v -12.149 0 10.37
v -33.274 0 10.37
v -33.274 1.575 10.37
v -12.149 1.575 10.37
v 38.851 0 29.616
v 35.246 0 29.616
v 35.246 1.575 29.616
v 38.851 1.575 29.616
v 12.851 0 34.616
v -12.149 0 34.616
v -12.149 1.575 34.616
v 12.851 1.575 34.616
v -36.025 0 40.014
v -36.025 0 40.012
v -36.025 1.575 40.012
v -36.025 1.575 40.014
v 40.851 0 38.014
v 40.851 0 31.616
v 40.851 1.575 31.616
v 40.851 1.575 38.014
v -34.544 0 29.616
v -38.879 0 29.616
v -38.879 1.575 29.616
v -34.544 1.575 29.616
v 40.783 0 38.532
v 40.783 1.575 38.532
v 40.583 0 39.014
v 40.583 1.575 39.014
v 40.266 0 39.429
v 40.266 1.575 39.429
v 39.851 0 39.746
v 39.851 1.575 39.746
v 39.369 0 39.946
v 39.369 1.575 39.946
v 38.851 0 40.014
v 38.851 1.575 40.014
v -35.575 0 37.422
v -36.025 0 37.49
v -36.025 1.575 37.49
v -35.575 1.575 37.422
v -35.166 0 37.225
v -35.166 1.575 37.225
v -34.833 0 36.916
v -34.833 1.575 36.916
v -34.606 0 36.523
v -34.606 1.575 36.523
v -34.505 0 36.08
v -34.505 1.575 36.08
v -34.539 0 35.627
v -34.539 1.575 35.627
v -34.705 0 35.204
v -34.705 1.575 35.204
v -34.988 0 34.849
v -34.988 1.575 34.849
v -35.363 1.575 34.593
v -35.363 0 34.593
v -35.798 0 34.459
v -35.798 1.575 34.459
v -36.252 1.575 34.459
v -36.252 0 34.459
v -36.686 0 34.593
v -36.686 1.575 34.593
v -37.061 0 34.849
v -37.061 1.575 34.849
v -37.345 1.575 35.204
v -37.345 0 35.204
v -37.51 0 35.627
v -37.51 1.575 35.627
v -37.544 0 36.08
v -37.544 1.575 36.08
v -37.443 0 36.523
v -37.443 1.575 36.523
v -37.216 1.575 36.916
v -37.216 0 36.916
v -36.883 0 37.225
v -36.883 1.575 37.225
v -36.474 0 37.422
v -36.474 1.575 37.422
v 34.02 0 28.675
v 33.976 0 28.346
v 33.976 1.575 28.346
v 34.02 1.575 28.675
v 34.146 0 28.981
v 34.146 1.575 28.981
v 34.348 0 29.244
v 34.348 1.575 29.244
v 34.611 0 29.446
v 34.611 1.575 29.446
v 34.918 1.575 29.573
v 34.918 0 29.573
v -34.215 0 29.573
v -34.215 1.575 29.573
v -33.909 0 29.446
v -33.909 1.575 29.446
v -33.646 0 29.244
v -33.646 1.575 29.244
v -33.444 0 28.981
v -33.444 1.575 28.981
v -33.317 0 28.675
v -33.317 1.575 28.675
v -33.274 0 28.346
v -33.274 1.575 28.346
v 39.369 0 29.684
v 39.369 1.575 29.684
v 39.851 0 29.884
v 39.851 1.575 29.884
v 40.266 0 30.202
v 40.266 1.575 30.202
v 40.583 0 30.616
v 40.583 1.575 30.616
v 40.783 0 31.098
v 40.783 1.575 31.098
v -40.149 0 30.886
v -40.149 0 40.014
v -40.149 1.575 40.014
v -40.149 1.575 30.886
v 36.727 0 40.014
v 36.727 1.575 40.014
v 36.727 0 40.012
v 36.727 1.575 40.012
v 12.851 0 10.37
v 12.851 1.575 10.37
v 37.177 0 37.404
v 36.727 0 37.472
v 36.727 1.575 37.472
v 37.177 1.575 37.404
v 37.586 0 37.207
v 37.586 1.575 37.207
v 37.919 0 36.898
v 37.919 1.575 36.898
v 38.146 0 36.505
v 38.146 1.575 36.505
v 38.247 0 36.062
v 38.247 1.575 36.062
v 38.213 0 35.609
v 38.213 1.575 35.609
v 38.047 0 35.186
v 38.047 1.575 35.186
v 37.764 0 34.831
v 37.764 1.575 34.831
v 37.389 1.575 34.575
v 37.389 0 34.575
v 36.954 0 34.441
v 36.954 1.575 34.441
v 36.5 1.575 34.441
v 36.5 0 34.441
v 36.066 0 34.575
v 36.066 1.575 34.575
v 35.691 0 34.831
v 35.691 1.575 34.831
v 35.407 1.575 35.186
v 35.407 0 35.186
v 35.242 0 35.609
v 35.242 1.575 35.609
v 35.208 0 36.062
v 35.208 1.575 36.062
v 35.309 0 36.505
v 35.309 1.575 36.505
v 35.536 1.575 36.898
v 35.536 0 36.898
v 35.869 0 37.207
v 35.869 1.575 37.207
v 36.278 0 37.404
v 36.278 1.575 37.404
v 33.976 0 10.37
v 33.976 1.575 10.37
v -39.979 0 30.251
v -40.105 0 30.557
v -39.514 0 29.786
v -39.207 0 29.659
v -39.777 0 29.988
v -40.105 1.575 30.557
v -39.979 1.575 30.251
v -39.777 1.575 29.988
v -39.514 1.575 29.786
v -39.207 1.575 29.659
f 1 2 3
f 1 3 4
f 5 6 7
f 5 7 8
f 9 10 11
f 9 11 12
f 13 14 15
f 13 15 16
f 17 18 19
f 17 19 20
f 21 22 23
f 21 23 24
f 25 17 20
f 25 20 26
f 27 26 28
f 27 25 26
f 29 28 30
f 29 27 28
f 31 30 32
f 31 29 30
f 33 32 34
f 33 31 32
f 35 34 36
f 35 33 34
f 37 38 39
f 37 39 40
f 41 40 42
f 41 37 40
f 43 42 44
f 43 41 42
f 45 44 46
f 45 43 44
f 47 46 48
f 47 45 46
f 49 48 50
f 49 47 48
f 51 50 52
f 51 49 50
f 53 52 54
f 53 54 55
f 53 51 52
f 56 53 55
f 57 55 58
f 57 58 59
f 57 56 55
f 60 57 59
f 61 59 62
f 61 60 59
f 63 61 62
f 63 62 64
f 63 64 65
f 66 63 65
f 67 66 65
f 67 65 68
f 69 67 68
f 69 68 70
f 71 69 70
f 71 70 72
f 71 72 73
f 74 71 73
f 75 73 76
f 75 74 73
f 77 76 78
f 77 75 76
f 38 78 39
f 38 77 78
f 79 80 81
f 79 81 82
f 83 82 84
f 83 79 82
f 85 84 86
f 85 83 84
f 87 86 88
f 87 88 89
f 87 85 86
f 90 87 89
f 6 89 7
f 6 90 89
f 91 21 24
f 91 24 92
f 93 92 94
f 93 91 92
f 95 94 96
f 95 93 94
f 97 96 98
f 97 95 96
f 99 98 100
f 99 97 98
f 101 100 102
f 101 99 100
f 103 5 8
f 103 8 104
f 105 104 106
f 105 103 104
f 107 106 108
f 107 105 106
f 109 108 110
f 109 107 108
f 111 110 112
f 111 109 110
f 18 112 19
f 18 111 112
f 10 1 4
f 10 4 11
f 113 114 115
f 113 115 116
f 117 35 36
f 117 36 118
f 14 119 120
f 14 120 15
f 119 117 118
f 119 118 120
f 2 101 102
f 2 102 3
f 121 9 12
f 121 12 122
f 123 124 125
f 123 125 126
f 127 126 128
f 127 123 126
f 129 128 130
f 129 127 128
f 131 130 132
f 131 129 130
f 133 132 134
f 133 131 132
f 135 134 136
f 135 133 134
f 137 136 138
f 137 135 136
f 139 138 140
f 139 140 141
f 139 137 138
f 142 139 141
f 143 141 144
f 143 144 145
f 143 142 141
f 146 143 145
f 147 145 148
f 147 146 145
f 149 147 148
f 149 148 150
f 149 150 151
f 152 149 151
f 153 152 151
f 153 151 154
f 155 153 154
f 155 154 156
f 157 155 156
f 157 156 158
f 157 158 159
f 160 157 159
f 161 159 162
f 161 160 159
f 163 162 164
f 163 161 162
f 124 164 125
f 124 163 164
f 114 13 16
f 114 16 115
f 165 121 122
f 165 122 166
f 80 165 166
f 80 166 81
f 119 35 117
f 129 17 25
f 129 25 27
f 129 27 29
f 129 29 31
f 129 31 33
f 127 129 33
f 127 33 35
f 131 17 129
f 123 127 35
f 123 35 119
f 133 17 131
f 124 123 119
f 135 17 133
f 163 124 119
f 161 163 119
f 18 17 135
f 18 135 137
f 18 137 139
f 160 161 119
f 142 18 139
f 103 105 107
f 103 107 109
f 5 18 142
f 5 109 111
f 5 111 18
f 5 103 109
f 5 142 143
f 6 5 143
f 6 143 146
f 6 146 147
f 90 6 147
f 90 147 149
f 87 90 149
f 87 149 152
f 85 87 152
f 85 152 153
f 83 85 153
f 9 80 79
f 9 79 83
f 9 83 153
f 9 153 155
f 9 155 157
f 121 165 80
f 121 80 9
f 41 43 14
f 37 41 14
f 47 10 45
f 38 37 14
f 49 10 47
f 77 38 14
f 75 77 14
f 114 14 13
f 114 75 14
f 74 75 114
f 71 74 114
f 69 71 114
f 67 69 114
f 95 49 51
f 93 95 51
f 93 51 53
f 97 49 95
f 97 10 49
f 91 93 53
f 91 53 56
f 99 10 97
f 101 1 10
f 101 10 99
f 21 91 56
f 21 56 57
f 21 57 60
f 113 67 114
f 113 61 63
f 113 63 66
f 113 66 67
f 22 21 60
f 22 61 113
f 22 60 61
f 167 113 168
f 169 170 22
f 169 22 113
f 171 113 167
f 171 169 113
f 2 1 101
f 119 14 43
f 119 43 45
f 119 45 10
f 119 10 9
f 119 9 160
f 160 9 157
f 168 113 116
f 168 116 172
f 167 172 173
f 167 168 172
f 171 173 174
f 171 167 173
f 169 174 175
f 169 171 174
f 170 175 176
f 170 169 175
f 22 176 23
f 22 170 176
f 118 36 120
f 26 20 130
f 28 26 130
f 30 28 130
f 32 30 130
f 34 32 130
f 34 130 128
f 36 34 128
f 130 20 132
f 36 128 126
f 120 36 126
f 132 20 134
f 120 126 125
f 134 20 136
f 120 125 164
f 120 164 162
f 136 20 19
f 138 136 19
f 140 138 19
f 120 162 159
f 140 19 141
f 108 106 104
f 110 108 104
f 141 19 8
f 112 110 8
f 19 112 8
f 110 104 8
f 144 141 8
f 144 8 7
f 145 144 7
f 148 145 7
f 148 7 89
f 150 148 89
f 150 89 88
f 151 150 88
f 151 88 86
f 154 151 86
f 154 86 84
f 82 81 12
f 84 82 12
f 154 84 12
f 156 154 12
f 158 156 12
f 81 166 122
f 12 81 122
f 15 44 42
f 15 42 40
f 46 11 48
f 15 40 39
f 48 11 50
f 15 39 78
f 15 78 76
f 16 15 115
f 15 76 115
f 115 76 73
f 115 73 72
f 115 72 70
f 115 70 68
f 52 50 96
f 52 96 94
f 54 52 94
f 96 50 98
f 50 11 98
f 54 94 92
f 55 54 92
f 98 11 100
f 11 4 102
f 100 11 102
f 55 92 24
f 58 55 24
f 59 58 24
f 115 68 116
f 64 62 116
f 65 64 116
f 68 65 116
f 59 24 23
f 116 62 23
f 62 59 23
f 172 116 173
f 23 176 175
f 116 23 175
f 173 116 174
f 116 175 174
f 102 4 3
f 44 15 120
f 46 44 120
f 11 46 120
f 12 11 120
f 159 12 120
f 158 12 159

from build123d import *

# Parameters (mm, degrees)
SKETCH1_R           = 1.524000008
SKETCH1_R_2         = 1.523999992
BOSS_EXTRUDE1_DEPTH = 1.575


with BuildPart() as part:
    # Sketch1 → Boss-Extrude1 (new body)
    with BuildSketch(Plane(origin=(0, 0, 0), x_dir=(1, 0, 0), z_dir=(0, 1, 0))):
        with BuildLine():
            Line((38.851293305, -40.014412246), (36.727293315, -40.014412246))
            Line((36.727293315, -40.014412246), (36.727293315, -40.012412246))
            Line((36.727293315, -40.012412246), (30.377293307, -40.012412246))
            Line((30.377293307, -40.012412246), (-29.674706693, -40.012412246))
            Line((-29.674706693, -40.012412246), (-36.024706701, -40.012412246))
            Line((-36.024706701, -40.012412246), (-36.024706701, -40.014412246))
            Line((-36.024706701, -40.014412246), (-40.148706691, -40.014412246))
            Line((-40.148706691, -40.014412246), (-40.148706691, -30.885946892))
            ThreePointArc((-40.148706691, -30.885946892), (-39.776732303, -29.98792128), (-38.878706691, -29.615946892))
            Line((-38.878706691, -29.615946892), (-34.543706691, -29.615946892))
            ThreePointArc((-34.543706691, -29.615946892), (-33.645681079, -29.243972504), (-33.273706691, -28.345946892))
            Line((-33.273706691, -28.345946892), (-33.273706691, -10.370428445))
            Line((-33.273706691, -10.370428445), (-12.148706691, -10.370428445))
            Line((-12.148706691, -10.370428445), (-12.148706691, -17.871301308))
            Line((-12.148706691, -17.871301308), (-12.148706691, -34.615947016))
            Line((-12.148706691, -34.615947016), (12.851293309, -34.615947016))
            Line((12.851293309, -34.615947016), (12.851293309, -17.871301308))
            Line((12.851293309, -17.871301308), (12.851293309, -10.370428445))
            Line((12.851293309, -10.370428445), (33.976293305, -10.370428445))
            Line((33.976293305, -10.370428445), (33.976293305, -28.345946892))
            ThreePointArc((33.976293305, -28.345946892), (34.348267693, -29.243972504), (35.246293305, -29.615946892))
            Line((35.246293305, -29.615946892), (38.851293305, -29.615946892))
            ThreePointArc((38.851293305, -29.615946892), (40.265506868, -30.20173333), (40.851293305, -31.615946892))
            Line((40.851293305, -31.615946892), (40.851293305, -38.014412246))
            ThreePointArc((40.851293305, -38.014412246), (40.265506868, -39.428625809), (38.851293305, -40.014412246))
        make_face()
        with Locations(Location((-36.024706701, -35.965946892, 0), (0, 0, 270))):
            Circle(SKETCH1_R, mode=Mode.SUBTRACT)
        with Locations(Location((36.727293315, -35.947946892, 0), (0, 0, 270))):
            Circle(SKETCH1_R_2, mode=Mode.SUBTRACT)
    extrude(amount=BOSS_EXTRUDE1_DEPTH)


solid = part.part
